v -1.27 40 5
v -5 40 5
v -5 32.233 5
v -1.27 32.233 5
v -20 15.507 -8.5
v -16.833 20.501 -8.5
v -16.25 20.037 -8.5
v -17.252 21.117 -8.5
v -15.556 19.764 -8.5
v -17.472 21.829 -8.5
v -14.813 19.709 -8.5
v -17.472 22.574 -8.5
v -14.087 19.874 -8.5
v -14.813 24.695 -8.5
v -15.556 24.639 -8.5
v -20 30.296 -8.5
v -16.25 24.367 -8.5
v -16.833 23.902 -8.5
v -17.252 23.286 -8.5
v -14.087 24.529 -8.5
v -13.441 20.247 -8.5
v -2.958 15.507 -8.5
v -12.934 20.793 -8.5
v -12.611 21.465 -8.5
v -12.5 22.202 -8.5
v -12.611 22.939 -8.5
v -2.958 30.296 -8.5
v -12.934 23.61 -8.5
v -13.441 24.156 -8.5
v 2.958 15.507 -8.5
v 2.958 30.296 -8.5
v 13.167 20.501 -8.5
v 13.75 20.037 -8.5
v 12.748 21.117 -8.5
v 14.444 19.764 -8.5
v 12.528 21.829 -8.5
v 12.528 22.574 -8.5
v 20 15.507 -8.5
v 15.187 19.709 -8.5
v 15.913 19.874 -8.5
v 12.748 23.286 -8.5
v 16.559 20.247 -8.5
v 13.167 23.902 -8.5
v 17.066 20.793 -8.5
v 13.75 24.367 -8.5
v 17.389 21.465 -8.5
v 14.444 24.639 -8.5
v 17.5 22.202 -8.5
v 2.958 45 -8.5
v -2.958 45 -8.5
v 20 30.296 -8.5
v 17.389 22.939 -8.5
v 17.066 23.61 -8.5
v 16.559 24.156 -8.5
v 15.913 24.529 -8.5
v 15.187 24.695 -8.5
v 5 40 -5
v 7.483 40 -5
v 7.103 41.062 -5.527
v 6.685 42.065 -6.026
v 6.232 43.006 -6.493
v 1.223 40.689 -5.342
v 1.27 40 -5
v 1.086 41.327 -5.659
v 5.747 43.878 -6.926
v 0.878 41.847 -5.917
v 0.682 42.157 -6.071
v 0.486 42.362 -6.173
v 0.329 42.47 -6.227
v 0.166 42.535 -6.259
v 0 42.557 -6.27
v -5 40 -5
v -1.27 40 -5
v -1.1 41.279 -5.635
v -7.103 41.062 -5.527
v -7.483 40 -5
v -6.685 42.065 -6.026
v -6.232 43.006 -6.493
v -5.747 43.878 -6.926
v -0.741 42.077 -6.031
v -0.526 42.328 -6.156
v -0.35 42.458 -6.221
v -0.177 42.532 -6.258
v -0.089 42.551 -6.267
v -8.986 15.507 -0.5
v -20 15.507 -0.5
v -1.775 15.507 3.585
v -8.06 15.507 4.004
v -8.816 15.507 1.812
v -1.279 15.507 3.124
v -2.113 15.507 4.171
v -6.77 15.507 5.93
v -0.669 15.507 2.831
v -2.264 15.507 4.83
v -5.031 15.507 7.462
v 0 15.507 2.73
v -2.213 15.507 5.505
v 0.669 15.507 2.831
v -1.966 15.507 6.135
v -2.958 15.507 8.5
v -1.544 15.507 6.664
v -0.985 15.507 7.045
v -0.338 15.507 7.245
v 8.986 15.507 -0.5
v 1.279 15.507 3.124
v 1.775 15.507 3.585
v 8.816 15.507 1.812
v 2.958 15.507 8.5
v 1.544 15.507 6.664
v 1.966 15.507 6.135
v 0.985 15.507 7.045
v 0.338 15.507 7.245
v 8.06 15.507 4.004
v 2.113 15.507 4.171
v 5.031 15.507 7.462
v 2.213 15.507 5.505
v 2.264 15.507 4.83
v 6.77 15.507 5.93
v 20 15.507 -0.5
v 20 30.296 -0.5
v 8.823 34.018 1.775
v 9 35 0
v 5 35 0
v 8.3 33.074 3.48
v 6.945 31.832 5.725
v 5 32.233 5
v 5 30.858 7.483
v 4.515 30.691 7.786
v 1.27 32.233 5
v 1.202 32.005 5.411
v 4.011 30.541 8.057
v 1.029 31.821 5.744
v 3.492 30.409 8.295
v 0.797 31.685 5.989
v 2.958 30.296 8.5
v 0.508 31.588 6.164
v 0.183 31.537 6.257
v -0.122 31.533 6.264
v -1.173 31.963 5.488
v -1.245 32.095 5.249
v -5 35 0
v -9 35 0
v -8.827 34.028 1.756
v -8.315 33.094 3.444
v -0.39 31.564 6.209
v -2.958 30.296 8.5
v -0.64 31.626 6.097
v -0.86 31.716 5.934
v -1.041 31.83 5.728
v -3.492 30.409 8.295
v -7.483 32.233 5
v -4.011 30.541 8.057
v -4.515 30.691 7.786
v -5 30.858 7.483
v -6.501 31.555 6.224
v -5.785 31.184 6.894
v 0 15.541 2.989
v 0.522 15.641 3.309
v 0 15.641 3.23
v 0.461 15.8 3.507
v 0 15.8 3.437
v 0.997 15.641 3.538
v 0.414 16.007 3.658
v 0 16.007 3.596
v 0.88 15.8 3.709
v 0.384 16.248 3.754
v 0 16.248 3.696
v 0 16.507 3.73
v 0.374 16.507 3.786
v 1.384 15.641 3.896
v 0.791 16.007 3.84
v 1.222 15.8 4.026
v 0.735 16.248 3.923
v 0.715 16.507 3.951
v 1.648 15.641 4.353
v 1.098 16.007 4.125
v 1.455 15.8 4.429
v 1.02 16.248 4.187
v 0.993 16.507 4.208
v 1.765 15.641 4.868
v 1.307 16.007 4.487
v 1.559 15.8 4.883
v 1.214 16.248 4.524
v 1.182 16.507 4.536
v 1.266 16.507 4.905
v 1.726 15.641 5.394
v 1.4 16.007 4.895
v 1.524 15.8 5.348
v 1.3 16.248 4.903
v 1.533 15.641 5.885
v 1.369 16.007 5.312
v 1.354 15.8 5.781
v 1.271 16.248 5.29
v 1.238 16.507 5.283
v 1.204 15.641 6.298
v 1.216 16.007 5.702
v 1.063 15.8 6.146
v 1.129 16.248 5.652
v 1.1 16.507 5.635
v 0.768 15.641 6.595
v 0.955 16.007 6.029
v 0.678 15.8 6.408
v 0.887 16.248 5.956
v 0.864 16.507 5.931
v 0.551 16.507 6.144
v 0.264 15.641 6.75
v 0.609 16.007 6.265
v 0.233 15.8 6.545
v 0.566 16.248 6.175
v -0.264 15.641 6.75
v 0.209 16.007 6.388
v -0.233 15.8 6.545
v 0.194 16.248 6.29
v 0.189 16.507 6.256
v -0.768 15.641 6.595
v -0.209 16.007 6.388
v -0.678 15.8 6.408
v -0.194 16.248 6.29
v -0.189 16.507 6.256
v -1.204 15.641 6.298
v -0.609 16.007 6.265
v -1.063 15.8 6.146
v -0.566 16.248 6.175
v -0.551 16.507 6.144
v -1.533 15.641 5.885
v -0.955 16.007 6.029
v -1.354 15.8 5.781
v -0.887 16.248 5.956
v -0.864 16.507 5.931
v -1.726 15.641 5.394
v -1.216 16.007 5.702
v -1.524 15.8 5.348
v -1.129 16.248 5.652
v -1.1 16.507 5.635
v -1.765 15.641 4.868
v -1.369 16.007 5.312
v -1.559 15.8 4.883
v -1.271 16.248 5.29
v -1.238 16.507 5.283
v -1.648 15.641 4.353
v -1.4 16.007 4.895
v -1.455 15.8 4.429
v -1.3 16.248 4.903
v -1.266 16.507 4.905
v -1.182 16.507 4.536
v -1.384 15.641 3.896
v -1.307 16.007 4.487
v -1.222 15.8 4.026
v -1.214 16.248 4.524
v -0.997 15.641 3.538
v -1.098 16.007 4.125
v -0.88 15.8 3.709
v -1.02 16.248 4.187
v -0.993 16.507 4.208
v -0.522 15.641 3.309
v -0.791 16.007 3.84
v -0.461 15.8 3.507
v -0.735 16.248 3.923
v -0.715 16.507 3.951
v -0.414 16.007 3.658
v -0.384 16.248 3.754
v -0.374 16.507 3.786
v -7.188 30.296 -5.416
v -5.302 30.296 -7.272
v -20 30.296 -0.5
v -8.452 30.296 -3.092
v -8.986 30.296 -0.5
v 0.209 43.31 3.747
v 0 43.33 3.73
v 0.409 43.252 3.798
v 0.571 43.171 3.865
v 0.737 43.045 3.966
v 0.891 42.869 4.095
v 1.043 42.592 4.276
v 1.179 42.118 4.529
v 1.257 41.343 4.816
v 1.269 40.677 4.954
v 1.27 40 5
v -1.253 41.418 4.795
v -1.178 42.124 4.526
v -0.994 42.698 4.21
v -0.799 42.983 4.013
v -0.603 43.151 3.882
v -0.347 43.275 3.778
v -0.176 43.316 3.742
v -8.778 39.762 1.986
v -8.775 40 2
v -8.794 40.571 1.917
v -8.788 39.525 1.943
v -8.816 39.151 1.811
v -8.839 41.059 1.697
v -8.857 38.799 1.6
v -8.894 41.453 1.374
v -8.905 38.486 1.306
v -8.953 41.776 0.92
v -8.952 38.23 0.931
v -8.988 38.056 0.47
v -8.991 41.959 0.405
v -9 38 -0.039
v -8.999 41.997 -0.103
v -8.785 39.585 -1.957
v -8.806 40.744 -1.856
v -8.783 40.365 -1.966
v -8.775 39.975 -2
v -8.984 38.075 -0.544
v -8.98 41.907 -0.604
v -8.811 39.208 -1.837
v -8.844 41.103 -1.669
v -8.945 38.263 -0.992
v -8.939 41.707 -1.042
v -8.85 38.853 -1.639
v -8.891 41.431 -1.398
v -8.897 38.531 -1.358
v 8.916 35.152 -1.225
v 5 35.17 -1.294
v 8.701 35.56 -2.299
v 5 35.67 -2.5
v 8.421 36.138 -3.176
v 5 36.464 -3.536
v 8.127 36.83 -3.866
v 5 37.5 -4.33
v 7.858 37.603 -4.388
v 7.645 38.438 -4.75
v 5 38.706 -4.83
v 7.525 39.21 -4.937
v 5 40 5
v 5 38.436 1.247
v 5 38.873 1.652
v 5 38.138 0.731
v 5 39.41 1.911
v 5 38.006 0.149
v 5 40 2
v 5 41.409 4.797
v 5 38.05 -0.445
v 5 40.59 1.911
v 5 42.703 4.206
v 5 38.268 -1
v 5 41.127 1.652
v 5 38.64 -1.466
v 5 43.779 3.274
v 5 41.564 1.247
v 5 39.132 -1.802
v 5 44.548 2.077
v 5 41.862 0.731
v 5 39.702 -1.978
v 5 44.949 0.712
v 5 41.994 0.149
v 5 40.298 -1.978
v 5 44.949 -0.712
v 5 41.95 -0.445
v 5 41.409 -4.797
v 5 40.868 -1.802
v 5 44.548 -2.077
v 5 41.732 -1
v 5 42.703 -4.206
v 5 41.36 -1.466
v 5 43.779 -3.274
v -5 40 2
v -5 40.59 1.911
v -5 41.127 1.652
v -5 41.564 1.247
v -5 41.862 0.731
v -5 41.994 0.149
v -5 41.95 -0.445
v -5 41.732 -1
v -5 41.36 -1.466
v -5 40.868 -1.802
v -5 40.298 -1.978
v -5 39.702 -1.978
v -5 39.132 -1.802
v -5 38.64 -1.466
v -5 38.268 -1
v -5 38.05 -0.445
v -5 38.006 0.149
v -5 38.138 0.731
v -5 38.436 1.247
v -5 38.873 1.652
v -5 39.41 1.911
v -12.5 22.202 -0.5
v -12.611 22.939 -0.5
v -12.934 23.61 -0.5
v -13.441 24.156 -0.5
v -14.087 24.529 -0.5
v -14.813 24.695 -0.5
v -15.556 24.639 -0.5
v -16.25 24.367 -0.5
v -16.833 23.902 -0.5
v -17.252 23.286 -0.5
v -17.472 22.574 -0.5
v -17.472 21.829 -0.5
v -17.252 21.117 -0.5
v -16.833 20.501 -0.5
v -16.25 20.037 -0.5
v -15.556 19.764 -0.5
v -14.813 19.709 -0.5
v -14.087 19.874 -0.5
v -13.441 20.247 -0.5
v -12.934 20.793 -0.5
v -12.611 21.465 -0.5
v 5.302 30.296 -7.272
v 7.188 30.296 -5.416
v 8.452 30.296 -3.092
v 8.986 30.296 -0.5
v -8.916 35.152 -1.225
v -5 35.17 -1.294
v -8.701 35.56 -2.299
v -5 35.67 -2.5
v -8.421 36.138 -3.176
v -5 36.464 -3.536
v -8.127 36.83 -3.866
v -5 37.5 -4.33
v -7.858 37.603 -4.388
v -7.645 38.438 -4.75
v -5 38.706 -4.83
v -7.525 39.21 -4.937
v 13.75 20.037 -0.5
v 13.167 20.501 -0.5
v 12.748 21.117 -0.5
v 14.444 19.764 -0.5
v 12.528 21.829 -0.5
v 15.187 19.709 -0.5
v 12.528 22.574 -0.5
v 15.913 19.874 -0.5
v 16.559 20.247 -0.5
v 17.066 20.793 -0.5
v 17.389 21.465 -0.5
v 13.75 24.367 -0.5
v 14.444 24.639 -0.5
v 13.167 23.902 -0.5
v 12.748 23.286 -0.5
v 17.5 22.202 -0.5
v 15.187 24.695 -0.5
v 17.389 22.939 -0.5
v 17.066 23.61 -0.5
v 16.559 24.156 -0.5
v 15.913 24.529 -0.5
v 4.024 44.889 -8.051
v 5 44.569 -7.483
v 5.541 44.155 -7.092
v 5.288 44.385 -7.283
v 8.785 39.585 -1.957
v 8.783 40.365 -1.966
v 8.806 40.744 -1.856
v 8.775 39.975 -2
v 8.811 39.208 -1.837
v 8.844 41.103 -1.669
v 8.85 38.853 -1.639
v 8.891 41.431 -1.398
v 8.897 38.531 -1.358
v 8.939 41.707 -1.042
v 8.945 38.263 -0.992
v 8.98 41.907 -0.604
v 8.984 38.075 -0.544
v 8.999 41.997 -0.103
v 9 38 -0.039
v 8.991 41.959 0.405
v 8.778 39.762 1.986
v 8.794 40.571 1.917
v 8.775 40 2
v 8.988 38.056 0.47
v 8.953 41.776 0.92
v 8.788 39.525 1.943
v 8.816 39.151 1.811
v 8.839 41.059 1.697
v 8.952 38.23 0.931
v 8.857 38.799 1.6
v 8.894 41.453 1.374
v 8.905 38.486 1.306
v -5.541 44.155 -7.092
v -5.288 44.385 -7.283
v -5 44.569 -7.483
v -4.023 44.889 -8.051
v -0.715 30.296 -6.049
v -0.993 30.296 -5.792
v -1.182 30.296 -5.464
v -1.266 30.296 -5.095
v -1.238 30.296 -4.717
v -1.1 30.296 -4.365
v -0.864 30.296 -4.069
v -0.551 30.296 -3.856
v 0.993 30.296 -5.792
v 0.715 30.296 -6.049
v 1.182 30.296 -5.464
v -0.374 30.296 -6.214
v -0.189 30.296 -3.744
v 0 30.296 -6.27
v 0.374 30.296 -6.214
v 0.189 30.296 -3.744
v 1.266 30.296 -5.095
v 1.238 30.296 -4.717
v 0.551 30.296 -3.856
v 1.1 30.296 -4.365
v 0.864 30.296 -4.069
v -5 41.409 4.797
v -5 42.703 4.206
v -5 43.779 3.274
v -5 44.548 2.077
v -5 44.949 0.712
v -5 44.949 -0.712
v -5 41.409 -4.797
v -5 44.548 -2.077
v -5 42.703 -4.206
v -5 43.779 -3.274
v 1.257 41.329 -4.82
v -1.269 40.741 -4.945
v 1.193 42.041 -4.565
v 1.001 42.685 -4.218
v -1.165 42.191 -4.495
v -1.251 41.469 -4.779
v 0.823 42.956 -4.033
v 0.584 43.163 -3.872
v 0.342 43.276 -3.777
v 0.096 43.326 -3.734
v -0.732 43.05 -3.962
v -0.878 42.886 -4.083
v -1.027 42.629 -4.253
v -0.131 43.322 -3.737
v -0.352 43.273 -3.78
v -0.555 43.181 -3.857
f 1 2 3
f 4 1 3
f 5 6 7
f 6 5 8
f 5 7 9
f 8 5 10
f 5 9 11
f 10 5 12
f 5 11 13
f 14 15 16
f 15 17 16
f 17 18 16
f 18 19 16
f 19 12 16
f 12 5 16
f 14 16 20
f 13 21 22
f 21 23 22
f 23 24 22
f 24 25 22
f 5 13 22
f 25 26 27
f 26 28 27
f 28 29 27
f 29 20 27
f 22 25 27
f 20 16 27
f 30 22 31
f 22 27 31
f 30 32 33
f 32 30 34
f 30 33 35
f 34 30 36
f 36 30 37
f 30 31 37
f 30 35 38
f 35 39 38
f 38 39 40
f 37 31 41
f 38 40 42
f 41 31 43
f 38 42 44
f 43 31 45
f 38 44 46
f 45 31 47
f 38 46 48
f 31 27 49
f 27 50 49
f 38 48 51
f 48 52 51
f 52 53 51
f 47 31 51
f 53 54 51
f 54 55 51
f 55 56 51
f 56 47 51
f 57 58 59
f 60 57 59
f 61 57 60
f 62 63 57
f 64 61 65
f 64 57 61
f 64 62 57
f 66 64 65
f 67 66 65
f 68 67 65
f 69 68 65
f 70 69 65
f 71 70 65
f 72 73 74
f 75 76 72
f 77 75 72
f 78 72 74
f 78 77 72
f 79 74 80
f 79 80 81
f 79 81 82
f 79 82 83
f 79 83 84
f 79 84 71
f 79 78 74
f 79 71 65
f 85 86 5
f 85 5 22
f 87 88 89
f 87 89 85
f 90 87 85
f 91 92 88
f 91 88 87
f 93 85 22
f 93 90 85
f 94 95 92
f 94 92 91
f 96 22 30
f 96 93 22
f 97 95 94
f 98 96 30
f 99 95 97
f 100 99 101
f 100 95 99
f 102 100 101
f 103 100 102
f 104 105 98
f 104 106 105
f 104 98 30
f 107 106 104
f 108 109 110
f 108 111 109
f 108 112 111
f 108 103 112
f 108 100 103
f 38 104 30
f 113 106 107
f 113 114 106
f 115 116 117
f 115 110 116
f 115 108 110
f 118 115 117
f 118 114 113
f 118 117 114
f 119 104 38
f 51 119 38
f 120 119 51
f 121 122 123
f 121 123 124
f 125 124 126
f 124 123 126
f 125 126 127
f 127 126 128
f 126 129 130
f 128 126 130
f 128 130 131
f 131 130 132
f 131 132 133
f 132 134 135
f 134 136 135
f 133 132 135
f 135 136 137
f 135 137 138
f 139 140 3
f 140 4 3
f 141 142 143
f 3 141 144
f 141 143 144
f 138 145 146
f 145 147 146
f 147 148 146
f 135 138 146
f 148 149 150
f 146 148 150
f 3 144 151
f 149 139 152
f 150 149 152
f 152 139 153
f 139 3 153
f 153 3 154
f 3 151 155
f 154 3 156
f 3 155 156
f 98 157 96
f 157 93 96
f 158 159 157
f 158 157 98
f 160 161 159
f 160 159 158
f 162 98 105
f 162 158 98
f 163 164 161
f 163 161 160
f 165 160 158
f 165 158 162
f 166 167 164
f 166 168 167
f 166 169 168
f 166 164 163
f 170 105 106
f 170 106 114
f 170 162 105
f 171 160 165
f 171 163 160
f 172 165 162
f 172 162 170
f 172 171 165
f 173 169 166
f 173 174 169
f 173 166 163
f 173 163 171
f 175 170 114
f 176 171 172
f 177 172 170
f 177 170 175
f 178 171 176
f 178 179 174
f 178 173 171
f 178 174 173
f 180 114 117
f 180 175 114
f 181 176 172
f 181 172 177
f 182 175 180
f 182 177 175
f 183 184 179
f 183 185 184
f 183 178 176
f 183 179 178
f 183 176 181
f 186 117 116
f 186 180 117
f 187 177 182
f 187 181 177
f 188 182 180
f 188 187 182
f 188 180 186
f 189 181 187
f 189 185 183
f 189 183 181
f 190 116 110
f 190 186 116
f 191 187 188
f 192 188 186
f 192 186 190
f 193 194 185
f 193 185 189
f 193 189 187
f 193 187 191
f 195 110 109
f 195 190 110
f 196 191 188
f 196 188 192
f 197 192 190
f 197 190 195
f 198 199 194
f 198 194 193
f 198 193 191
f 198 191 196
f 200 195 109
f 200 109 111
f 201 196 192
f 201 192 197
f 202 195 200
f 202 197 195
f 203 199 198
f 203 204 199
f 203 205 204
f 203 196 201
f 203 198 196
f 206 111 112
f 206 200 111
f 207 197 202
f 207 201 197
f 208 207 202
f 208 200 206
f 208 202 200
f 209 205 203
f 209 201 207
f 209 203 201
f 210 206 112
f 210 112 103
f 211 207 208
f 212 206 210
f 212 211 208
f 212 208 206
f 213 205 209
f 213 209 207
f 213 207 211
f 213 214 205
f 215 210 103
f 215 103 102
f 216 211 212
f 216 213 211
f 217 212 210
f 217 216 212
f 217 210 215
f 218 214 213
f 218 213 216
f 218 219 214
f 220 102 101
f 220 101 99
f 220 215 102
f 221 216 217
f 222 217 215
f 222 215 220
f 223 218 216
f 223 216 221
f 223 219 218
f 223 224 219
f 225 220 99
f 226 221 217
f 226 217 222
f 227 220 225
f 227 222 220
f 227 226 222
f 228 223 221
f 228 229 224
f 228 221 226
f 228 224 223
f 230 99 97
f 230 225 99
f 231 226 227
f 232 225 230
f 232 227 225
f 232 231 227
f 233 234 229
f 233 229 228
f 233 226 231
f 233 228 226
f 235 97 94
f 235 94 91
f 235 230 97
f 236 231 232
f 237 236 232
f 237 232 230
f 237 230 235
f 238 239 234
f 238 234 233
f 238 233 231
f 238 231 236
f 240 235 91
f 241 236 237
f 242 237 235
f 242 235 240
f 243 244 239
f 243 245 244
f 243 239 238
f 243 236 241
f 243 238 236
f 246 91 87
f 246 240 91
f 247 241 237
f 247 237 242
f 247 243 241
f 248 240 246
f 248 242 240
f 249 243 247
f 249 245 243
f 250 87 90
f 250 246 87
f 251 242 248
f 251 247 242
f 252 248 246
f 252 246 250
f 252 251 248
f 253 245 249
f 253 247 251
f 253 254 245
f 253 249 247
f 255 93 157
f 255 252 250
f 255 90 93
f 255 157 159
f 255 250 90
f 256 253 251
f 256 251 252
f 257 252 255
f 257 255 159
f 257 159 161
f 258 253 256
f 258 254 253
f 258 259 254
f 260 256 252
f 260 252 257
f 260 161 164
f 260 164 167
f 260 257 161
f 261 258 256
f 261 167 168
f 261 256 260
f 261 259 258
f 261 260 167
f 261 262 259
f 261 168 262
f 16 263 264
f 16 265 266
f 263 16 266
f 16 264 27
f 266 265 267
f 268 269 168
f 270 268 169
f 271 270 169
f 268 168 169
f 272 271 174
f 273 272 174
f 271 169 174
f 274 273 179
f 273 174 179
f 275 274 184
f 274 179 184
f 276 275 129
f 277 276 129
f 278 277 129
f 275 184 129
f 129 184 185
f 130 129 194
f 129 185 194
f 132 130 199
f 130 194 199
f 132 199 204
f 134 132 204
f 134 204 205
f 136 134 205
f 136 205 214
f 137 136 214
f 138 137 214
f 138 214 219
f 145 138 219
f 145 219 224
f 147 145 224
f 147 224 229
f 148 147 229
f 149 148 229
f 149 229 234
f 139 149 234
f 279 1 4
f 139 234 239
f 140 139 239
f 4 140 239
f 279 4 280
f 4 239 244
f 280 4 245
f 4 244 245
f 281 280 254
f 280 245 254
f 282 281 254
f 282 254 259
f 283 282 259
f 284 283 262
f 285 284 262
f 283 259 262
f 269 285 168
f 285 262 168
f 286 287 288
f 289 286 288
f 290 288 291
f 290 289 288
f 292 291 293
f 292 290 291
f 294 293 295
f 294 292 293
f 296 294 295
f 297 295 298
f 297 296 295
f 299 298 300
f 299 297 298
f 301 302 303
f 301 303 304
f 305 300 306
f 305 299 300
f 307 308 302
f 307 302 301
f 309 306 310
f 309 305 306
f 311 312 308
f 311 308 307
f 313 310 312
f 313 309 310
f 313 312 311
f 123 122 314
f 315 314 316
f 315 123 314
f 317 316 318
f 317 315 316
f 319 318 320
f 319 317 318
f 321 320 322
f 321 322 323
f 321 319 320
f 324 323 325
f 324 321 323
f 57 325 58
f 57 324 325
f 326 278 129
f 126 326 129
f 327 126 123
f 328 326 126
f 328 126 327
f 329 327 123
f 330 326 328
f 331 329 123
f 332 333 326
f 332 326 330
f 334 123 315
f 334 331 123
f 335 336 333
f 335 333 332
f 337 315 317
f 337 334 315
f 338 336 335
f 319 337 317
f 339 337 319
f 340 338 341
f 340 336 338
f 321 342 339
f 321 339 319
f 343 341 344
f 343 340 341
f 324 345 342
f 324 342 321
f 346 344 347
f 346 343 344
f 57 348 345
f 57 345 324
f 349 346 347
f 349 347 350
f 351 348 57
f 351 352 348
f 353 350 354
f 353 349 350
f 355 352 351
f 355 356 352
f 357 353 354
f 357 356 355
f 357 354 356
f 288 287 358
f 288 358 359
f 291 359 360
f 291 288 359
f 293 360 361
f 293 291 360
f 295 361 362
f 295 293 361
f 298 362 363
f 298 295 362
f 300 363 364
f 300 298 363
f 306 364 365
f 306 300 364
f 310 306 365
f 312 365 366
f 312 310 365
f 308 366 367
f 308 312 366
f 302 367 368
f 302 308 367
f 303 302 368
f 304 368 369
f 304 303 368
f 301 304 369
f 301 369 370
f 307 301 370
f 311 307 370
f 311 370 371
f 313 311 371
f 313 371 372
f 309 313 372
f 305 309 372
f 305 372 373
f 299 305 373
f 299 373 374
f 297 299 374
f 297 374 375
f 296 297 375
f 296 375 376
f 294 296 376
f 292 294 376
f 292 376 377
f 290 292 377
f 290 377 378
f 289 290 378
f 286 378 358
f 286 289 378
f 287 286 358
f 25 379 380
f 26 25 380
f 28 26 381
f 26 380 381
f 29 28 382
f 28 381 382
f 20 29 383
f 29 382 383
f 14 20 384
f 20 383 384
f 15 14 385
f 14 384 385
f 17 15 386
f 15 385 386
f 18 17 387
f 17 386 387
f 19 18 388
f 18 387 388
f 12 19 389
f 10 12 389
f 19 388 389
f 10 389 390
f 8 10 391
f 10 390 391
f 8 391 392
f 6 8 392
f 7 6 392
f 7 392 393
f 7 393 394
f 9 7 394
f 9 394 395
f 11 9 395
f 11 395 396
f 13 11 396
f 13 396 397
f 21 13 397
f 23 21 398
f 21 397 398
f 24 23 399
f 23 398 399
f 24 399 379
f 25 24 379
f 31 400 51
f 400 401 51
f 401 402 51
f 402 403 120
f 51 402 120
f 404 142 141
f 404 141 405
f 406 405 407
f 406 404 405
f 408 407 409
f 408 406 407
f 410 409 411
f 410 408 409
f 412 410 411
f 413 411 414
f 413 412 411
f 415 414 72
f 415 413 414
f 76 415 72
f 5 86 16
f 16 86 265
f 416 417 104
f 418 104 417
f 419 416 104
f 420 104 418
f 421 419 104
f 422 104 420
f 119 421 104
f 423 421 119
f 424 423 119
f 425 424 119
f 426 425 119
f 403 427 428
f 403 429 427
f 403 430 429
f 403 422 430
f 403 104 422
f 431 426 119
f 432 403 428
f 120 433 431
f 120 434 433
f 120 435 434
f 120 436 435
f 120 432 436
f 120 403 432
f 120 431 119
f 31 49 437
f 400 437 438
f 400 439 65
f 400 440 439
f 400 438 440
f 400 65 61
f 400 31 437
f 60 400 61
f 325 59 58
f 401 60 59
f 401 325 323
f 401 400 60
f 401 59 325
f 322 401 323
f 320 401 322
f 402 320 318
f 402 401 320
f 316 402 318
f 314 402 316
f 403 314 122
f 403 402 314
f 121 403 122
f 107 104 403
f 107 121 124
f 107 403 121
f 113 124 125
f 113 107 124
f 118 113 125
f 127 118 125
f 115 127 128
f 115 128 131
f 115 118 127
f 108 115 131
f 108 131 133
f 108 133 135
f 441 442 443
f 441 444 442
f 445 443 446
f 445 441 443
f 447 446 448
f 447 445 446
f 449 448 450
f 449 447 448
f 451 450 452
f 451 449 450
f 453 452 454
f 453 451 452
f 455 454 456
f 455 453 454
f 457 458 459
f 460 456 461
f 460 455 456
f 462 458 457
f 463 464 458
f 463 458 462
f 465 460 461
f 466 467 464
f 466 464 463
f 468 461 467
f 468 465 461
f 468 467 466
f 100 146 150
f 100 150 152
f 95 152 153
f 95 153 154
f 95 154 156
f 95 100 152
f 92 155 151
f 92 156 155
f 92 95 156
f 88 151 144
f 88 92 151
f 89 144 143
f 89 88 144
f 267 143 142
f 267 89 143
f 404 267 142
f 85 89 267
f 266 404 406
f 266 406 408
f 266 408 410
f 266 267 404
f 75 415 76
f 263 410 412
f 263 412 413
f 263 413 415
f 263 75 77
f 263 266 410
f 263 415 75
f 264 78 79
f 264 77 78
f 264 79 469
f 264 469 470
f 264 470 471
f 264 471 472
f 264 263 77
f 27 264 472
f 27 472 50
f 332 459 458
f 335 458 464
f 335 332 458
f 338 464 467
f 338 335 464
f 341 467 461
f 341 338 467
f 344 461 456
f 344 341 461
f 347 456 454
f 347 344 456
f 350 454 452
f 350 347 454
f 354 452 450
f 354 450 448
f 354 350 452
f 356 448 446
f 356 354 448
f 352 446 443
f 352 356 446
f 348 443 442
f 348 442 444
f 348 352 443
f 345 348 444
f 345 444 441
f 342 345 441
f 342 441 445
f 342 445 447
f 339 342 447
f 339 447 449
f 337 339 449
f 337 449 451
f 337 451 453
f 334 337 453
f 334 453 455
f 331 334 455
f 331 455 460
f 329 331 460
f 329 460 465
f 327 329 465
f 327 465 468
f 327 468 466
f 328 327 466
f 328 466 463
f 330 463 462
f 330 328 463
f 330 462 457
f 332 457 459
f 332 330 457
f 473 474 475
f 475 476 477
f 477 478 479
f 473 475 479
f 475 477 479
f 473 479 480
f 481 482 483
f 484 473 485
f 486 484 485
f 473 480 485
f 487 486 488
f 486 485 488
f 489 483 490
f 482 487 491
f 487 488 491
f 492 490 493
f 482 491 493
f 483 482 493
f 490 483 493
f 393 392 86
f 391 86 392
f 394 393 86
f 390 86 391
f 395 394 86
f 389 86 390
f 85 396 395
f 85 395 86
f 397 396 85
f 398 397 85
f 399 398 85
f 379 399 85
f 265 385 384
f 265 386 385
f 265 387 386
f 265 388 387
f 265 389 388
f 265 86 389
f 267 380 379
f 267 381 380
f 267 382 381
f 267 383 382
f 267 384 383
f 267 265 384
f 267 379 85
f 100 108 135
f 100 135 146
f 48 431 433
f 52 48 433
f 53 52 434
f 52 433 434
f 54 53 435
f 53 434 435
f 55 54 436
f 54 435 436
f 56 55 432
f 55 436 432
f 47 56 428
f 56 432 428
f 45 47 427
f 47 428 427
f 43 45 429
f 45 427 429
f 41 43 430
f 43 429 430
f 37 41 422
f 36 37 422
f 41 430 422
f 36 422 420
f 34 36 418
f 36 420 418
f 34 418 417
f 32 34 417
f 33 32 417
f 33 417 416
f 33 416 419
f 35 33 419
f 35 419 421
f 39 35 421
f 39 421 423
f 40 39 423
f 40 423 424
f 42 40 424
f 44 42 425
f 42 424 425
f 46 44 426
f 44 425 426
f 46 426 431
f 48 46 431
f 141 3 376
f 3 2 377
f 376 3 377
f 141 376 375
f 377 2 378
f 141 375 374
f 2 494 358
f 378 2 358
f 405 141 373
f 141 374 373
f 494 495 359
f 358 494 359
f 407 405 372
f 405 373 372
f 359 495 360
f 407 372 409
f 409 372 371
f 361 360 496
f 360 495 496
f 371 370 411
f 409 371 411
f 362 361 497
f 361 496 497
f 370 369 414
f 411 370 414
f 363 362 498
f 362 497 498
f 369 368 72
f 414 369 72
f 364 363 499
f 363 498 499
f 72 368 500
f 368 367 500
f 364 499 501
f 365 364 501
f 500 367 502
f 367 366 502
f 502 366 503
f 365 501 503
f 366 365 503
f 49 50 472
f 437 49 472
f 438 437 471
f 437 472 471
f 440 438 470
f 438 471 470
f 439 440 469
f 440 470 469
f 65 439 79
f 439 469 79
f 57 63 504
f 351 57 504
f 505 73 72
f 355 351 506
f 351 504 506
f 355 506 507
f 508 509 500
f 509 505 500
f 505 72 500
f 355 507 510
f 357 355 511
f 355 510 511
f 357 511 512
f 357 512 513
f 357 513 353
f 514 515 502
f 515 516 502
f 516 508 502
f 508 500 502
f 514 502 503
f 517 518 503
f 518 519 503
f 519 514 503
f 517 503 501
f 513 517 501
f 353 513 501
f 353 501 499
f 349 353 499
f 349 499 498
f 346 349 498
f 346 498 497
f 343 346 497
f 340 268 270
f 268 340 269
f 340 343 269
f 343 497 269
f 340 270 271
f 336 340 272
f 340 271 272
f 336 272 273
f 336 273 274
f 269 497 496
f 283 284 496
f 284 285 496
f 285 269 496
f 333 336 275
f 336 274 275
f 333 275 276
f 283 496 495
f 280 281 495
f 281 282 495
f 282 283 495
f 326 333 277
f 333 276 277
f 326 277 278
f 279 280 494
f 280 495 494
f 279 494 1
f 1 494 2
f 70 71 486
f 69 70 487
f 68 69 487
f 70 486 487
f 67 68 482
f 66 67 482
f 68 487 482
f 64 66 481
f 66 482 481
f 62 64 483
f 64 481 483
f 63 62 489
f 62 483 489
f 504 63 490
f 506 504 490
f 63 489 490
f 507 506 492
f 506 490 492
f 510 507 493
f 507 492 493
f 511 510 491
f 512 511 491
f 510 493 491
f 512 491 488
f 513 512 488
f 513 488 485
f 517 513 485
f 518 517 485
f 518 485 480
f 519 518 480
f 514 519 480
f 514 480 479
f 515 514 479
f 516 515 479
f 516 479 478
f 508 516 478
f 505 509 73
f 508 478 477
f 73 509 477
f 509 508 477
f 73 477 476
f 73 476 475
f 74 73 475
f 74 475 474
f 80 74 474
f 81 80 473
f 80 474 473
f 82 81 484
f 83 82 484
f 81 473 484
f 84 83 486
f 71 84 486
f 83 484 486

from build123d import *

# Parameters (mm, degrees)
BOSS_EXTRUDE1_DEPTH = 45
SKETCH2_R           = 1.27
CUT_EXTRUDE1_DEPTH  = 51.256
CUT_EXTRUDE2_REACH  = 50.939
SKETCH3_W           = 10
SKETCH3_H           = 10
SKETCH4_R           = 2.049999964
CUT_EXTRUDE3_DEPTH  = 17.5
CUT_EXTRUDE5_START  = -7.95804
SKETCH6_R           = 2
CUT_EXTRUDE5_DEPTH  = 9.6
FILLET3_R           = 1
CUT_EXTRUDE6_START  = 8.64596
SKETCH6_3_R         = 2
CUT_EXTRUDE6_DEPTH  = 6.604
CUT_EXTRUDE7_START  = -14.986
CUT_EXTRUDE7_DEPTH  = 14.986
SKETCH9_W           = 75.785705501
SKETCH9_H           = 55.117400044
CUT_EXTRUDE9_DEPTH  = 51.308
FILLET4_R           = 1
BOSS_EXTRUDE2_START = -9
SKETCH11_W          = 40
SKETCH11_H          = 14.788433541
SKETCH11_R          = 2.5
BOSS_EXTRUDE2_DEPTH = 8


with BuildPart() as part:
    # Sketch1 → Boss-Extrude1 (new body)
    with BuildSketch(Plane(origin=(0, 0, 0), x_dir=(1, 0, 0), z_dir=(0, 1, 0))):
        with BuildLine():
            Line((-2.958039892, 8.5), (2.958039892, 8.5))
            ThreePointArc((2.958039892, 8.5), (9, 0), (2.958039892, -8.5))
            Line((2.958039892, -8.5), (-2.958039892, -8.5))
            ThreePointArc((-2.958039892, -8.5), (-9, 0), (-2.958039892, 8.5))
        make_face()
    extrude(amount=BOSS_EXTRUDE1_DEPTH)

    # Sketch2 → Cut-Extrude1 (cut)
    with BuildSketch(Plane.XZ):
        with Locations(Location((0, -5, 0), (0, 0, 270))):
            Circle(SKETCH2_R)
        with Locations(Location((0, 5, 0), (0, 0, 270))):
            Circle(SKETCH2_R)
    extrude(amount=-CUT_EXTRUDE1_DEPTH, mode=Mode.SUBTRACT)

    # Cut-Extrude2: up to this face of the body (flat: up to its plane)
    cut_extrude2_end = Plane(part.part.faces().sort_by_distance((0, 22.5, 8.5))[0])
    # Sketch3 → Cut-Extrude2 (cut, up to the picked face)
    with BuildSketch(Plane(origin=(0, 0, -8.5), x_dir=(-1, 0, 0), z_dir=(0, 0, -1)), mode=Mode.PRIVATE) as cut_extrude2_sk1:
        with Locations((0, 5)):
            Rectangle(SKETCH3_W, SKETCH3_H)
    cut_extrude2_tool1 = split(extrude(cut_extrude2_sk1.sketch, amount=-CUT_EXTRUDE2_REACH, mode=Mode.PRIVATE), bisect_by=cut_extrude2_end, keep=Keep.BOTH, mode=Mode.PRIVATE)
    add(cut_extrude2_tool1.solids().sort_by(Axis((0, 5, -8.5), (0, 0, 1)))[0], mode=Mode.SUBTRACT)

    # Sketch4 → Cut-Extrude3 (cut, symmetric)
    with BuildSketch(Plane.ZY.offset(-5)):
        with Locations(Location((0, 5, 0), (0, 0, 270))):
            Circle(SKETCH4_R)
        with BuildLine():
            Line((-7.483314774, 10), (-5, 5))
            ThreePointArc((-5, 5), (0, 0), (5, 5))
            Line((5, 5), (8.5, 12.308552788))
            Line((8.5, 12.308552788), (9.857943437, -1.822240199))
            Line((9.857943437, -1.822240199), (-9.857943437, -1.822240199))
            Line((-9.857943437, -1.822240199), (-7.483314774, 10))
        make_face()
    extrude(amount=CUT_EXTRUDE3_DEPTH, both=True, mode=Mode.SUBTRACT)

    # Sketch6 → Cut-Extrude5 (cut)
    with BuildSketch(Plane.ZY.offset(2.958039892).offset(CUT_EXTRUDE5_START)):
        with BuildLine():
            Line((8.5, 30.295597565), (0, 35))
            ThreePointArc((0, 35), (-3.535533906, 36.464466094), (-5, 40))
            Line((-5, 40), (-6.925993812, 43.877868872))
            ThreePointArc((-6.925993812, 43.877868872), (-7.572574331, 44.635904287), (-8.5, 45))
            Line((-8.5, 45), (18.346383487, 50.62633631))
            Line((18.346383487, 50.62633631), (8.5, 30.295597565))
        make_face()
        with Locations((0, 40)):
            Circle(SKETCH6_R, mode=Mode.SUBTRACT)
    extrude(amount=-CUT_EXTRUDE5_DEPTH, mode=Mode.SUBTRACT)

    # Fillet3
    fillet3_edges = [part.edges().sort_by_distance(p)[0] for p in [
        (0, 10, -3.73),
        (0, 10, 6.27),
    ]]
    fillet(fillet3_edges, radius=FILLET3_R)

    # Sketch6<3> → Cut-Extrude6 (cut)
    with BuildSketch(Plane.ZY.offset(2.958039892).offset(CUT_EXTRUDE6_START)):
        with BuildLine():
            Line((8.5, 30.295597565), (0, 35))
            ThreePointArc((0, 35), (-3.535533906, 36.464466094), (-5, 40))
            Line((-5, 40), (-6.925993812, 43.877868872))
            ThreePointArc((-6.925993812, 43.877868872), (-7.572574331, 44.635904287), (-8.5, 45))
            Line((-8.5, 45), (18.346383487, 50.62633631))
            Line((18.346383487, 50.62633631), (8.5, 30.295597565))
        make_face()
        with Locations((0, 40)):
            Circle(SKETCH6_3_R, mode=Mode.SUBTRACT)
    extrude(amount=-CUT_EXTRUDE6_DEPTH, mode=Mode.SUBTRACT)

    # Sketch7 → Cut-Extrude7 (cut)
    with BuildSketch(Plane(origin=(5, 0, 0), x_dir=(0, 0, -1), z_dir=(1, 0, 0)).offset(CUT_EXTRUDE7_START)):
        with BuildLine():
            Line((-5, 40), (-5, 32.23270445))
            Line((-5, 32.23270445), (-8.5, 30.295597565))
            Line((-8.5, 30.295597565), (-10.643597919, 58.76944937))
            Line((-10.643597919, 58.76944937), (18.960626954, 55.630212042))
            Line((18.960626954, 55.630212042), (8.5, 45))
            ThreePointArc((8.5, 45), (7.572574331, 44.635904287), (6.925993812, 43.877868872))
            Line((6.925993812, 43.877868872), (5, 40))
            ThreePointArc((5, 40), (0, 45), (-5, 40))
        make_face()
    extrude(amount=CUT_EXTRUDE7_DEPTH, mode=Mode.SUBTRACT)

    # Sketch9 → Cut-Extrude9 (cut)
    with BuildSketch(Plane.XY.offset(8.5)):
        with Locations((-12.772136987, -12.051535998)):
            Rectangle(SKETCH9_W, SKETCH9_H)
    extrude(amount=-CUT_EXTRUDE9_DEPTH, mode=Mode.SUBTRACT)

    # Fillet4
    fillet4_edges = [part.edges().sort_by_distance(p)[0] for p in [
        (0, 15.507164024, -3.73),
        (0, 15.507164024, 6.27),
    ]]
    fillet(fillet4_edges, radius=FILLET4_R)

    # Sketch11 → Boss-Extrude2 (add)
    with BuildSketch(Plane.XY.offset(8.5).offset(BOSS_EXTRUDE2_START)):
        with Locations((0, 22.901380794)):
            Rectangle(SKETCH11_W, SKETCH11_H)
        with Locations((15, 22.201664168)):
            Circle(SKETCH11_R, mode=Mode.SUBTRACT)
        with Locations((-15, 22.201664168)):
            Circle(SKETCH11_R, mode=Mode.SUBTRACT)
    extrude(amount=-BOSS_EXTRUDE2_DEPTH)


solid = part.part
